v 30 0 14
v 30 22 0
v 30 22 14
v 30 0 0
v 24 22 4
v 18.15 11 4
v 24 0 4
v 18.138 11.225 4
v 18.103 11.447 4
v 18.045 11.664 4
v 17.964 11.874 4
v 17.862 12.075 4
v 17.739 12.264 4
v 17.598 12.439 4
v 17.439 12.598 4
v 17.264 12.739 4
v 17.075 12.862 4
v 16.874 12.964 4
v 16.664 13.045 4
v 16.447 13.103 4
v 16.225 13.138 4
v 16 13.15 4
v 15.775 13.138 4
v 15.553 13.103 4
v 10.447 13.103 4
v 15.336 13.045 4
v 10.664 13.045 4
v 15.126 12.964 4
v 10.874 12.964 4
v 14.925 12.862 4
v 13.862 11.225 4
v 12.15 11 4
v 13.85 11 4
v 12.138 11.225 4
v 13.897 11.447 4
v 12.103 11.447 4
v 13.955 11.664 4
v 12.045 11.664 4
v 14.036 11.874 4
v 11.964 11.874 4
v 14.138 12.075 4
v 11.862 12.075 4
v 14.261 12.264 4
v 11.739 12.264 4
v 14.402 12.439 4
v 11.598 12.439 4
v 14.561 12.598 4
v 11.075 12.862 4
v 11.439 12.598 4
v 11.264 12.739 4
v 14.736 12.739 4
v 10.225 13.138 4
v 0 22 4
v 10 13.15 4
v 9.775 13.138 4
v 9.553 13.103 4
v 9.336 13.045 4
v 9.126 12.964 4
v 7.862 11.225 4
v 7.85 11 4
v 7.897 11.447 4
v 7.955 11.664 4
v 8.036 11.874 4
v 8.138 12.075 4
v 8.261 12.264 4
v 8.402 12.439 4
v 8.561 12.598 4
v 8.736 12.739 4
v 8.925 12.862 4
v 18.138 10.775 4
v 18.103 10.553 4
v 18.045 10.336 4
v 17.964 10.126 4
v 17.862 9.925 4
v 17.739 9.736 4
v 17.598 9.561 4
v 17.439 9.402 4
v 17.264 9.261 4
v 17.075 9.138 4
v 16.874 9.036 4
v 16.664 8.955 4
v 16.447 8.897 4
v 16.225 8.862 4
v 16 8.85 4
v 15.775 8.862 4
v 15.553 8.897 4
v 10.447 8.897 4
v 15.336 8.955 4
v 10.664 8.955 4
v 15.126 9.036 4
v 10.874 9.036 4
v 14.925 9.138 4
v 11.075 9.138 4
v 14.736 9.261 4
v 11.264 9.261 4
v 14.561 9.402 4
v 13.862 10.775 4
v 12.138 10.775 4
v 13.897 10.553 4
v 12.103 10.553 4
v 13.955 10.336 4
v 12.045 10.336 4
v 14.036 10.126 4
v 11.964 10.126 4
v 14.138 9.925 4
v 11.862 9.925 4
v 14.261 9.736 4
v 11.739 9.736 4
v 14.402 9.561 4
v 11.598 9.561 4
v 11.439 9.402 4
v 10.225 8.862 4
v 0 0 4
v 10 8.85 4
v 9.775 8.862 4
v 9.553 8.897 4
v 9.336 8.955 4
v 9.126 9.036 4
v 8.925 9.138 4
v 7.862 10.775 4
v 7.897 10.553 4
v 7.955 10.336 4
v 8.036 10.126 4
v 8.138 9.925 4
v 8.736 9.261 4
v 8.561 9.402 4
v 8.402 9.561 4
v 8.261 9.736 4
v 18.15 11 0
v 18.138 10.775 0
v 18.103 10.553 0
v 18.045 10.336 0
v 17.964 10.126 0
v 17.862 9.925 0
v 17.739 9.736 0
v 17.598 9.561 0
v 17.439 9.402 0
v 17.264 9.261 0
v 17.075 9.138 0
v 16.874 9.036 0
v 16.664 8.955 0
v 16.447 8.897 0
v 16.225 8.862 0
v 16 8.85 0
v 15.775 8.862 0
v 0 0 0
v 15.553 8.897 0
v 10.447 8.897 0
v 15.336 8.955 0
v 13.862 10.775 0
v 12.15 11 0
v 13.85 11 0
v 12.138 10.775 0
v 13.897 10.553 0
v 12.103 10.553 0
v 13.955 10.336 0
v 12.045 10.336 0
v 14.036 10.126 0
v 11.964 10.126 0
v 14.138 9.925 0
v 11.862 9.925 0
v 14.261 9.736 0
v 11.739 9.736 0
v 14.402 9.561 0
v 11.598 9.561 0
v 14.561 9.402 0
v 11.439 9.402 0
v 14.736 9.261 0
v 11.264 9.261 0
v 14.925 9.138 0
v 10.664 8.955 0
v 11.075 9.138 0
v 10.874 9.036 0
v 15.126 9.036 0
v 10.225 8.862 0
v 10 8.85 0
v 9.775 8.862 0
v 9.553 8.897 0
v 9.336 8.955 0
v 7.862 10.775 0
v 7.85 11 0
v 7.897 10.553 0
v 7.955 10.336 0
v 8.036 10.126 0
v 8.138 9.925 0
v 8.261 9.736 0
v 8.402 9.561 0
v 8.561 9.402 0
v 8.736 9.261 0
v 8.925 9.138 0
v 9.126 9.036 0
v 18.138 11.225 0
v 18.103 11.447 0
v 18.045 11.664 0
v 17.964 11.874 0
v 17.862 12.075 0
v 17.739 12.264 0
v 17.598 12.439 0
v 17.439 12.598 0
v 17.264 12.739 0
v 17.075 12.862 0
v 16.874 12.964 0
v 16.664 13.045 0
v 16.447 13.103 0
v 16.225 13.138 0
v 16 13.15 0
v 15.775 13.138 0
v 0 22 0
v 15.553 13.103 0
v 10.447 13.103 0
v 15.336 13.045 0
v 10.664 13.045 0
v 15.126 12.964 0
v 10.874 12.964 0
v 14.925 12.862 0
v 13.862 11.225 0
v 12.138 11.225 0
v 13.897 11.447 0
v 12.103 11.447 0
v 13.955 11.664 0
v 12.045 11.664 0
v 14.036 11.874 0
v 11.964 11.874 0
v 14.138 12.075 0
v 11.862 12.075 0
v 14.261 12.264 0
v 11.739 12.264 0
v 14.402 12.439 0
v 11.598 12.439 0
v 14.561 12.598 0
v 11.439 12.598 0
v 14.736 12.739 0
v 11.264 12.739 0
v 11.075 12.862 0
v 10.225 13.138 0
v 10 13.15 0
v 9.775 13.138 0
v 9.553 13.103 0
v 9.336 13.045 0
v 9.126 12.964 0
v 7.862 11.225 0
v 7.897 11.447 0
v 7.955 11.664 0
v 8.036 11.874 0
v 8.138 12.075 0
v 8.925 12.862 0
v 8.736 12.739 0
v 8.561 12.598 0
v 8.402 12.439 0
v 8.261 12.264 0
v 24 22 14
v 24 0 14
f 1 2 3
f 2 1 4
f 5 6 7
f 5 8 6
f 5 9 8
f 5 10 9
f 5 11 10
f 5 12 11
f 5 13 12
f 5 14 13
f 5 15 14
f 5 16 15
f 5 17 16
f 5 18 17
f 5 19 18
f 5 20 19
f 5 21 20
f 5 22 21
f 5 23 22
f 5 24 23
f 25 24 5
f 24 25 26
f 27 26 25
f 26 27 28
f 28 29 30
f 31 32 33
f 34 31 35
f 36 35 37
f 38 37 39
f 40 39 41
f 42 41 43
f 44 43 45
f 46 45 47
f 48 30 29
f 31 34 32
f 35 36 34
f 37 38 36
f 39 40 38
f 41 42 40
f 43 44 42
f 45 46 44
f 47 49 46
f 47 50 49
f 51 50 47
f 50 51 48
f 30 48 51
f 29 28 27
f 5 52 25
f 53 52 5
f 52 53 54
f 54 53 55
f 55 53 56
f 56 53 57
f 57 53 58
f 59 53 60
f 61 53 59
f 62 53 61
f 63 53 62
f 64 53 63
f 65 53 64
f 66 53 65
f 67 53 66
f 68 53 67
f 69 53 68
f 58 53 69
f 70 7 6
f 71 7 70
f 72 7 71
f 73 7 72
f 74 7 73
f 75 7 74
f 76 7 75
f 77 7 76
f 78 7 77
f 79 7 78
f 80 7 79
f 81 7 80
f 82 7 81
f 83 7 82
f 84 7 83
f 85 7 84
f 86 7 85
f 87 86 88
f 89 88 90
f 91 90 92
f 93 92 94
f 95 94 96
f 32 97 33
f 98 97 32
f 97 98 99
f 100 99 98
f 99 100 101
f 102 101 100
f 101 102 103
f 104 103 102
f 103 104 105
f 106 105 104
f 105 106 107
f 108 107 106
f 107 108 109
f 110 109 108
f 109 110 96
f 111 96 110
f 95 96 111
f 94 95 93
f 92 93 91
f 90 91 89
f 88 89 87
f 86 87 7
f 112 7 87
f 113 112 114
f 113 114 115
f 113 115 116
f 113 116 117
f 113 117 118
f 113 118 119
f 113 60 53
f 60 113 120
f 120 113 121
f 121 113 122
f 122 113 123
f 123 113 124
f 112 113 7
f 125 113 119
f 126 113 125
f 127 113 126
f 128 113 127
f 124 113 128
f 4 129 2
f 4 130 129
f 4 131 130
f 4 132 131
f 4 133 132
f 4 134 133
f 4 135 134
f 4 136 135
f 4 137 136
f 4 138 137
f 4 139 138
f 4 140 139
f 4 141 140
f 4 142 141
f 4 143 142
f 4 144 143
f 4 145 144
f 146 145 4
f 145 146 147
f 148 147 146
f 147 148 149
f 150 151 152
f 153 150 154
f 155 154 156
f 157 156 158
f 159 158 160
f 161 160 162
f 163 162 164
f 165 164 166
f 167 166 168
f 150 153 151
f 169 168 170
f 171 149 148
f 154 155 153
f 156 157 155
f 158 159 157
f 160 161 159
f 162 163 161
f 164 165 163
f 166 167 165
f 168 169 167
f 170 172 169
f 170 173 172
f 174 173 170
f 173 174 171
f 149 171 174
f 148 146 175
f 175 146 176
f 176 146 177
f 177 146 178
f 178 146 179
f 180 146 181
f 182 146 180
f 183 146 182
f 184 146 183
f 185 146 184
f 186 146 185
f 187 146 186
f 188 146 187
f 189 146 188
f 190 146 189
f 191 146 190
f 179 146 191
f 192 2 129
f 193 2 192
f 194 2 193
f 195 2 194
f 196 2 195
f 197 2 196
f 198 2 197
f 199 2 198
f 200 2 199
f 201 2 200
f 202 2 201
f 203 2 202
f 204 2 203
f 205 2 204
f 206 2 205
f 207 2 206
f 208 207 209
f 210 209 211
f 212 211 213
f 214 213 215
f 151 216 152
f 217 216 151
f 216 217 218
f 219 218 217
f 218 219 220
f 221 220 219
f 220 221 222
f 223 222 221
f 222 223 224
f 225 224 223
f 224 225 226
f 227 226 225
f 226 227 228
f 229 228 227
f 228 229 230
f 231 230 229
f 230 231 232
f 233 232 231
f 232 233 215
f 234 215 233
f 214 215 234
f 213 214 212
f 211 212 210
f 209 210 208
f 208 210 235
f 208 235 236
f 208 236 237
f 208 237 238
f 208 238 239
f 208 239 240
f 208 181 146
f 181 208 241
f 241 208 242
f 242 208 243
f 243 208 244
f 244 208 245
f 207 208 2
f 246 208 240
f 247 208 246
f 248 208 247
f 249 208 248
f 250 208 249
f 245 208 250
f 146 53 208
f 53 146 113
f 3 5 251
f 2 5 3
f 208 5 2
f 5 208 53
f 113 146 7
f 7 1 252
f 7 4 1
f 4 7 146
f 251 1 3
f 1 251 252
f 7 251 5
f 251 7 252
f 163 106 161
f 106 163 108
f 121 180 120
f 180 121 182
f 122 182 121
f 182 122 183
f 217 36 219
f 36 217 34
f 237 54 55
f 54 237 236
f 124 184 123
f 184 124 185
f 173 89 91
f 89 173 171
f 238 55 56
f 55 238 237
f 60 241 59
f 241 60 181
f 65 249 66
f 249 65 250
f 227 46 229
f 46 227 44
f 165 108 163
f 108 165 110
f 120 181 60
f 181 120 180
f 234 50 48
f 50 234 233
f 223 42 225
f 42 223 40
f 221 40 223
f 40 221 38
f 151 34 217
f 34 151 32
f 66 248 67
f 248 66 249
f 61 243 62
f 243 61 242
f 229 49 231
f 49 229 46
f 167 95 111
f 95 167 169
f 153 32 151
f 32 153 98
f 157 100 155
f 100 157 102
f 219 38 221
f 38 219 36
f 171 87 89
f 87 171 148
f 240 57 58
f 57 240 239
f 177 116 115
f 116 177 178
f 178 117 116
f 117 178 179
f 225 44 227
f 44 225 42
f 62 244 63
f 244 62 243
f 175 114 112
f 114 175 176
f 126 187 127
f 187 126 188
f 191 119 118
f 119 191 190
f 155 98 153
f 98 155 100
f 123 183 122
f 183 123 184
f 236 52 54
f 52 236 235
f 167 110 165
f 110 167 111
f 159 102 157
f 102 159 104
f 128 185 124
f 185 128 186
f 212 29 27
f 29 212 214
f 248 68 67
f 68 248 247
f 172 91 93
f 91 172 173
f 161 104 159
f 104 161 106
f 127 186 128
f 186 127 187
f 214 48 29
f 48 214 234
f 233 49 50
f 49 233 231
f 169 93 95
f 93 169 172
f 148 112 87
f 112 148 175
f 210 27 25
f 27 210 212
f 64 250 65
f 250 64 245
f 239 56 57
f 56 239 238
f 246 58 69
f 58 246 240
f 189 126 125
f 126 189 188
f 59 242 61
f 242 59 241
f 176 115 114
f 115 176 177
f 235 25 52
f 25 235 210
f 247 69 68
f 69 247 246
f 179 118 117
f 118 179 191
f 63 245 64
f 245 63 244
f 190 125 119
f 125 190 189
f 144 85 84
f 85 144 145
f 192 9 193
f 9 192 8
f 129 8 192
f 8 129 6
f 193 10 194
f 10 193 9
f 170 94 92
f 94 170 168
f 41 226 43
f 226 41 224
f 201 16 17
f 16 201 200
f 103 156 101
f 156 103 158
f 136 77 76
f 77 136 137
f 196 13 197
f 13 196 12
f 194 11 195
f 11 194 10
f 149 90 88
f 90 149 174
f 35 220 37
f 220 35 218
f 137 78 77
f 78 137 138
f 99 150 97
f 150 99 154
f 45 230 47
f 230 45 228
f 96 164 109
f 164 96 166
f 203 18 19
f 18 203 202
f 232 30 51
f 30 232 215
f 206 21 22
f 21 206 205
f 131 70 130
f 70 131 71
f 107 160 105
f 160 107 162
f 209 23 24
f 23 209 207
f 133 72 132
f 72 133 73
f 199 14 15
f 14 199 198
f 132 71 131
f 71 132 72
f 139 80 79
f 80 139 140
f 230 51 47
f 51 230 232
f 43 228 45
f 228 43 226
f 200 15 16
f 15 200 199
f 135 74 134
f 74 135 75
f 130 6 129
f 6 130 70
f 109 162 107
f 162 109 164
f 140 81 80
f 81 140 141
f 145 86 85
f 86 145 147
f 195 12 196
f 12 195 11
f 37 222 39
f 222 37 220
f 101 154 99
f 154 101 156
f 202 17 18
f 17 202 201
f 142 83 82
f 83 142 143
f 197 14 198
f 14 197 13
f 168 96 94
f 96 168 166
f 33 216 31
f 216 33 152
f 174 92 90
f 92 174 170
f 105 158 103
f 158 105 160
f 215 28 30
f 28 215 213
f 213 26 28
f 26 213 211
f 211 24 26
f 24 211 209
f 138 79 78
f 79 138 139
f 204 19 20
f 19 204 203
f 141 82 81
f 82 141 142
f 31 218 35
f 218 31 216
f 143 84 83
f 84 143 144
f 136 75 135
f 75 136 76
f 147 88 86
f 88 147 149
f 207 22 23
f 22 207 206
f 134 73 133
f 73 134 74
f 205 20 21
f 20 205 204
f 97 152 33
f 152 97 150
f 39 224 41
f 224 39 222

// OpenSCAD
// Latch catch plate.
$fn = 60;
eps = 0.02;
length = 30;
height = 10;
width = 22;
thickness = 4;
difference() {
    union() { cube([length,width,thickness]); translate([length-6,0,thickness]) cube([6,width,height]); }
    for(x=[10,length-14]) translate([x,width/2,-eps]) cylinder(d=4.3,h=thickness+2*eps);
}
